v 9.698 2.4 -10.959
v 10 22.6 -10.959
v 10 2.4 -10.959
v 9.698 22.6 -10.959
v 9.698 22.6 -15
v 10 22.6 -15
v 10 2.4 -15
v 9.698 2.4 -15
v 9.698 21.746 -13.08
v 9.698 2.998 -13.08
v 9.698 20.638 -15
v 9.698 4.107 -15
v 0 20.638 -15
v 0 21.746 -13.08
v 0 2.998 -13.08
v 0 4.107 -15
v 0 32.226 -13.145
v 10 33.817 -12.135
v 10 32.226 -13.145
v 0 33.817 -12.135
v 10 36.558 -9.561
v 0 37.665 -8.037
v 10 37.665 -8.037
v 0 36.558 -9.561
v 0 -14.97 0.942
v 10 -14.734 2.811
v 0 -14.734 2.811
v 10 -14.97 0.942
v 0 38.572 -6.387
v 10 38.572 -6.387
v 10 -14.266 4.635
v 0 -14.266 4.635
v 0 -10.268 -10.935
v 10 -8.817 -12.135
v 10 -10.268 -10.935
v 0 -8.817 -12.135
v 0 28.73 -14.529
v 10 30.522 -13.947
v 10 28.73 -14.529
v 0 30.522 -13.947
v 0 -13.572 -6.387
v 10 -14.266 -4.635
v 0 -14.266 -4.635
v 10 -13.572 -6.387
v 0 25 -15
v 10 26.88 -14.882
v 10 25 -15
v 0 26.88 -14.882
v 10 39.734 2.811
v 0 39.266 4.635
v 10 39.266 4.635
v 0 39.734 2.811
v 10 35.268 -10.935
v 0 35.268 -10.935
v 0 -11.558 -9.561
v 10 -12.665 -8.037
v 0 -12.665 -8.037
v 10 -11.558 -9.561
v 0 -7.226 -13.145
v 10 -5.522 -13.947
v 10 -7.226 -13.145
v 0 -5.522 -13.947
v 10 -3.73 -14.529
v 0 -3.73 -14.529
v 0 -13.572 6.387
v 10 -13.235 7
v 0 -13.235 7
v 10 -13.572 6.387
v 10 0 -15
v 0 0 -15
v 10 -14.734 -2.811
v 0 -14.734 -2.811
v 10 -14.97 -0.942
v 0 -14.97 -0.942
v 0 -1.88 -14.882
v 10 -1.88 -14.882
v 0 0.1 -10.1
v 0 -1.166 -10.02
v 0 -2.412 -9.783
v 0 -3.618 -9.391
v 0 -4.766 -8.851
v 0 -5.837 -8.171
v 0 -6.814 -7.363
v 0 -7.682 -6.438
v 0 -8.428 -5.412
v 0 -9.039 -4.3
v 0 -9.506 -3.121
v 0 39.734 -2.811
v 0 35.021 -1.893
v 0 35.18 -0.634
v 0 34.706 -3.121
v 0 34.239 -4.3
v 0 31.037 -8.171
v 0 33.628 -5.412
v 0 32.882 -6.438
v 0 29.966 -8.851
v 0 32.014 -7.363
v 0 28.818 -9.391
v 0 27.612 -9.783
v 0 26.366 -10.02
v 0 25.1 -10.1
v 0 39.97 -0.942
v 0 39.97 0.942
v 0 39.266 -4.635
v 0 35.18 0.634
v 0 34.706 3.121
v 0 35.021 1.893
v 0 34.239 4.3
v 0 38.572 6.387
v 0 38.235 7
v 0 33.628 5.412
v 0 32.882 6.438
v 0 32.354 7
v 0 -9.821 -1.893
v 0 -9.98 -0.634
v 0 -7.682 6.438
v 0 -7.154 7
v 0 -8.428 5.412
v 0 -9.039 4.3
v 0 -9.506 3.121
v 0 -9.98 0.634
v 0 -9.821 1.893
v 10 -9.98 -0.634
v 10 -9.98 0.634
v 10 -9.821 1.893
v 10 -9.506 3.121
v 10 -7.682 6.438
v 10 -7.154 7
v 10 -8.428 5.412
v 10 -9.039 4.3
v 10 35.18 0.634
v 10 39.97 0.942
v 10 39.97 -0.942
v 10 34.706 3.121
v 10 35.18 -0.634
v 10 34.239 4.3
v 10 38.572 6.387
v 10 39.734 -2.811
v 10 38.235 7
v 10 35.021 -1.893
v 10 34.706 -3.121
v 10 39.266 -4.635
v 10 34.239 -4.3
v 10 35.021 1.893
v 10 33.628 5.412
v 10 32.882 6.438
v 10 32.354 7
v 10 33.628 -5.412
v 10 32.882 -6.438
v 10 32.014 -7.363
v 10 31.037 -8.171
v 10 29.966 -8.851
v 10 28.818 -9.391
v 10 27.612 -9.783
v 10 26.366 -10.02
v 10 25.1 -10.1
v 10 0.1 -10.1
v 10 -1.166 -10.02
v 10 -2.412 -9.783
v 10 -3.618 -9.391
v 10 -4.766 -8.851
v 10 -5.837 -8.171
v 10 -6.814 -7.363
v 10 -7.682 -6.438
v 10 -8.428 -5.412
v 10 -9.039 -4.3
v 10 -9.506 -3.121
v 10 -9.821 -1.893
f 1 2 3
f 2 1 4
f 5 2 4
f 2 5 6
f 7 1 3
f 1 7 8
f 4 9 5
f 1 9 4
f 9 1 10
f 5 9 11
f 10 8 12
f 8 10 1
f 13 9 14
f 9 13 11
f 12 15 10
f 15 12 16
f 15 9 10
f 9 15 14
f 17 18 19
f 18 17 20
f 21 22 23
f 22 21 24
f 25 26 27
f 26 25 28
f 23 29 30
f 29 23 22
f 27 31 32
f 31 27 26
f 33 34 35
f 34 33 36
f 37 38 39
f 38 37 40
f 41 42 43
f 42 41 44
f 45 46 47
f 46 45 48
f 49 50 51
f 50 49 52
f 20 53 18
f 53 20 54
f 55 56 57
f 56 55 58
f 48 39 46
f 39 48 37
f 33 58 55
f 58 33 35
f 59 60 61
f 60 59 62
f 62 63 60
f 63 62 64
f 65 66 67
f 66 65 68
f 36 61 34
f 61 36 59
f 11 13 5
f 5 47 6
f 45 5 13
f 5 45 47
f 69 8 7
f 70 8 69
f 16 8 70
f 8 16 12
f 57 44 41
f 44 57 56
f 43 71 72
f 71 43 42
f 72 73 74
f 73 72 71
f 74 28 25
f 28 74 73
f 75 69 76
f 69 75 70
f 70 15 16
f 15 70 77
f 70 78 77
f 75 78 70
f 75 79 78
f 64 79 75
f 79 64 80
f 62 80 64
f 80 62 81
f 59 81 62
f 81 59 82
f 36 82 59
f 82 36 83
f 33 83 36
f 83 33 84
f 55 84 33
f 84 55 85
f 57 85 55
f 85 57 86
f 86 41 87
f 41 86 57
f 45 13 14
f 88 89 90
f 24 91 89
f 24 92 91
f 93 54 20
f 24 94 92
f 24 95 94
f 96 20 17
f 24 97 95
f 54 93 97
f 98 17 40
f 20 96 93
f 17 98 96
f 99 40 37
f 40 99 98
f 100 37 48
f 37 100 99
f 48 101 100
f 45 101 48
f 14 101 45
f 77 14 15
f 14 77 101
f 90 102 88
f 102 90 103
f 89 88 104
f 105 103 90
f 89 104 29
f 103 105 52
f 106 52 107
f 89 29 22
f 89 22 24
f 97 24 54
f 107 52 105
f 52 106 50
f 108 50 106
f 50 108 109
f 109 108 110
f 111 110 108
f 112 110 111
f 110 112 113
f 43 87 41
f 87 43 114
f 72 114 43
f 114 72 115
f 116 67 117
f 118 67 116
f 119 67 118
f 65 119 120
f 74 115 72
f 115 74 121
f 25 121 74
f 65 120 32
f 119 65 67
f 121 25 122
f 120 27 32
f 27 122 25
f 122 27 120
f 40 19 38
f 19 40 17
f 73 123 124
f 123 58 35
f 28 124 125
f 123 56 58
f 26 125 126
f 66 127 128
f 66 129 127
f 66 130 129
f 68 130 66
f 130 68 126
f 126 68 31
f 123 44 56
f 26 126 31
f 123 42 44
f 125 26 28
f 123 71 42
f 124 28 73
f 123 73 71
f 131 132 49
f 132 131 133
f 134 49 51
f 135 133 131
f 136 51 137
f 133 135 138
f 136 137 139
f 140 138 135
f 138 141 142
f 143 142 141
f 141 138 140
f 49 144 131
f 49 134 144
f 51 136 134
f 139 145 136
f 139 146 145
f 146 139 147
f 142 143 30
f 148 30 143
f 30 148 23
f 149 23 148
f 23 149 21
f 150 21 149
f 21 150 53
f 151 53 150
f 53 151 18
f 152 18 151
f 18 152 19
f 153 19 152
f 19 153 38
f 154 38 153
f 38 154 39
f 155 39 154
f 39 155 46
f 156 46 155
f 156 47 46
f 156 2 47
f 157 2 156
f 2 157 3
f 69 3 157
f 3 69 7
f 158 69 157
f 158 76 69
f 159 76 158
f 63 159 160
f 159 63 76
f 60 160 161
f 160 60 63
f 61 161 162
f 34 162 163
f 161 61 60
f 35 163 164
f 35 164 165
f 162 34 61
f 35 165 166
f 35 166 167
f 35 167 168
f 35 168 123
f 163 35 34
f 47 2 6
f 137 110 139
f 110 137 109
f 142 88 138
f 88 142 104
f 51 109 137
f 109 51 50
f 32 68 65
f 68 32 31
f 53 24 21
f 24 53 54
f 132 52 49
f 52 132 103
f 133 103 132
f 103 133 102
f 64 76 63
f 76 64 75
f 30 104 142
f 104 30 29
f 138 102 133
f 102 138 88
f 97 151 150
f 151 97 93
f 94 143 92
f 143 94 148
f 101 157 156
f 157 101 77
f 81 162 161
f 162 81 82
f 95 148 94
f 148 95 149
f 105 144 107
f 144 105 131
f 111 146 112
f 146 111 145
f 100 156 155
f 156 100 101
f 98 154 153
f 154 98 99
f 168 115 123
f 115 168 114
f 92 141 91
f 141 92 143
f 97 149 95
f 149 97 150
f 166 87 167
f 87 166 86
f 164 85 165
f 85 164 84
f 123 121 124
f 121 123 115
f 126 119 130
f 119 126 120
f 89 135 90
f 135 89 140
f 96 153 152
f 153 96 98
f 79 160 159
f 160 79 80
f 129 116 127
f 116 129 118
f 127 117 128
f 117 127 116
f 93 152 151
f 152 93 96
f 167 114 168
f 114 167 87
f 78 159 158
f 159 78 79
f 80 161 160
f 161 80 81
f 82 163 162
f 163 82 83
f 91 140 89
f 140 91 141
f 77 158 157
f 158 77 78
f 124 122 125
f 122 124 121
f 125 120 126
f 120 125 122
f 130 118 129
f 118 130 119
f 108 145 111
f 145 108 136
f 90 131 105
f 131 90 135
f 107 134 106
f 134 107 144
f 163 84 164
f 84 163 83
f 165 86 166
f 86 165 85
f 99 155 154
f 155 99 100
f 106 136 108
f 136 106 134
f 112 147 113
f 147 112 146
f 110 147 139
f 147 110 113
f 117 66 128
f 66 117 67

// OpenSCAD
module battery() {
	color([0.2,0.2,1])
	hull() {
	cylinder(d=22,h=92,$fn=50);
	translate([0,25,0])
		cylinder(d=22,h=92,$fn=50);
	}
}

module clip() {
	gap = 0.2;

	difference() {
	rotate([0,90,0])
		hull() {
			cylinder(d=30,h=10,$fn=50);
			translate([0,25,0])
				cylinder(d=30,h=10,$fn=50);
			};
	translate([-0.2,gap/2,0])		
	rotate([0,90,0])		
	hull() {
		cylinder(d=20+gap,h=92,$fn=50);
		translate([0,25,0])
			cylinder(d=20+gap,h=92,$fn=50);
		};
	translate([-1,-20,7])
	cube([94,60,20]);
     
    translate([-0.2,2.4,-15.1])
        scale([1.01,1.01,1.01])
            bar();
	}	
}

module bar() {
    difference() {
    cube([92,20,4.1]);

    translate([82.2,18,0])
        rotate([-30,0,0])
            cube([10,10,10]);
    translate([82.2,-9.8,0])
        rotate([-60,0,0])
            cube([10,10,10]);


    translate([-0.2,18,0])
        rotate([-30,0,0])
            cube([10,10,10]);
    translate([-0.2,-9.8,0])
        rotate([-60,0,0])
            cube([10,10,10]);
        
    translate([-1.2,-1,2.0])    
        cube([11,22,5]);   

    translate([82.2,-1,2.0])    
        cube([11,22,5]);  

    }
}

module assembled() {

clip();

translate([0,2.5,-14])
    bar();

translate([82,0,0])
	clip();

}


/*
assembled();

rotate([0,90,0])
	battery();
*/

clip(); //2 required
//bar();
